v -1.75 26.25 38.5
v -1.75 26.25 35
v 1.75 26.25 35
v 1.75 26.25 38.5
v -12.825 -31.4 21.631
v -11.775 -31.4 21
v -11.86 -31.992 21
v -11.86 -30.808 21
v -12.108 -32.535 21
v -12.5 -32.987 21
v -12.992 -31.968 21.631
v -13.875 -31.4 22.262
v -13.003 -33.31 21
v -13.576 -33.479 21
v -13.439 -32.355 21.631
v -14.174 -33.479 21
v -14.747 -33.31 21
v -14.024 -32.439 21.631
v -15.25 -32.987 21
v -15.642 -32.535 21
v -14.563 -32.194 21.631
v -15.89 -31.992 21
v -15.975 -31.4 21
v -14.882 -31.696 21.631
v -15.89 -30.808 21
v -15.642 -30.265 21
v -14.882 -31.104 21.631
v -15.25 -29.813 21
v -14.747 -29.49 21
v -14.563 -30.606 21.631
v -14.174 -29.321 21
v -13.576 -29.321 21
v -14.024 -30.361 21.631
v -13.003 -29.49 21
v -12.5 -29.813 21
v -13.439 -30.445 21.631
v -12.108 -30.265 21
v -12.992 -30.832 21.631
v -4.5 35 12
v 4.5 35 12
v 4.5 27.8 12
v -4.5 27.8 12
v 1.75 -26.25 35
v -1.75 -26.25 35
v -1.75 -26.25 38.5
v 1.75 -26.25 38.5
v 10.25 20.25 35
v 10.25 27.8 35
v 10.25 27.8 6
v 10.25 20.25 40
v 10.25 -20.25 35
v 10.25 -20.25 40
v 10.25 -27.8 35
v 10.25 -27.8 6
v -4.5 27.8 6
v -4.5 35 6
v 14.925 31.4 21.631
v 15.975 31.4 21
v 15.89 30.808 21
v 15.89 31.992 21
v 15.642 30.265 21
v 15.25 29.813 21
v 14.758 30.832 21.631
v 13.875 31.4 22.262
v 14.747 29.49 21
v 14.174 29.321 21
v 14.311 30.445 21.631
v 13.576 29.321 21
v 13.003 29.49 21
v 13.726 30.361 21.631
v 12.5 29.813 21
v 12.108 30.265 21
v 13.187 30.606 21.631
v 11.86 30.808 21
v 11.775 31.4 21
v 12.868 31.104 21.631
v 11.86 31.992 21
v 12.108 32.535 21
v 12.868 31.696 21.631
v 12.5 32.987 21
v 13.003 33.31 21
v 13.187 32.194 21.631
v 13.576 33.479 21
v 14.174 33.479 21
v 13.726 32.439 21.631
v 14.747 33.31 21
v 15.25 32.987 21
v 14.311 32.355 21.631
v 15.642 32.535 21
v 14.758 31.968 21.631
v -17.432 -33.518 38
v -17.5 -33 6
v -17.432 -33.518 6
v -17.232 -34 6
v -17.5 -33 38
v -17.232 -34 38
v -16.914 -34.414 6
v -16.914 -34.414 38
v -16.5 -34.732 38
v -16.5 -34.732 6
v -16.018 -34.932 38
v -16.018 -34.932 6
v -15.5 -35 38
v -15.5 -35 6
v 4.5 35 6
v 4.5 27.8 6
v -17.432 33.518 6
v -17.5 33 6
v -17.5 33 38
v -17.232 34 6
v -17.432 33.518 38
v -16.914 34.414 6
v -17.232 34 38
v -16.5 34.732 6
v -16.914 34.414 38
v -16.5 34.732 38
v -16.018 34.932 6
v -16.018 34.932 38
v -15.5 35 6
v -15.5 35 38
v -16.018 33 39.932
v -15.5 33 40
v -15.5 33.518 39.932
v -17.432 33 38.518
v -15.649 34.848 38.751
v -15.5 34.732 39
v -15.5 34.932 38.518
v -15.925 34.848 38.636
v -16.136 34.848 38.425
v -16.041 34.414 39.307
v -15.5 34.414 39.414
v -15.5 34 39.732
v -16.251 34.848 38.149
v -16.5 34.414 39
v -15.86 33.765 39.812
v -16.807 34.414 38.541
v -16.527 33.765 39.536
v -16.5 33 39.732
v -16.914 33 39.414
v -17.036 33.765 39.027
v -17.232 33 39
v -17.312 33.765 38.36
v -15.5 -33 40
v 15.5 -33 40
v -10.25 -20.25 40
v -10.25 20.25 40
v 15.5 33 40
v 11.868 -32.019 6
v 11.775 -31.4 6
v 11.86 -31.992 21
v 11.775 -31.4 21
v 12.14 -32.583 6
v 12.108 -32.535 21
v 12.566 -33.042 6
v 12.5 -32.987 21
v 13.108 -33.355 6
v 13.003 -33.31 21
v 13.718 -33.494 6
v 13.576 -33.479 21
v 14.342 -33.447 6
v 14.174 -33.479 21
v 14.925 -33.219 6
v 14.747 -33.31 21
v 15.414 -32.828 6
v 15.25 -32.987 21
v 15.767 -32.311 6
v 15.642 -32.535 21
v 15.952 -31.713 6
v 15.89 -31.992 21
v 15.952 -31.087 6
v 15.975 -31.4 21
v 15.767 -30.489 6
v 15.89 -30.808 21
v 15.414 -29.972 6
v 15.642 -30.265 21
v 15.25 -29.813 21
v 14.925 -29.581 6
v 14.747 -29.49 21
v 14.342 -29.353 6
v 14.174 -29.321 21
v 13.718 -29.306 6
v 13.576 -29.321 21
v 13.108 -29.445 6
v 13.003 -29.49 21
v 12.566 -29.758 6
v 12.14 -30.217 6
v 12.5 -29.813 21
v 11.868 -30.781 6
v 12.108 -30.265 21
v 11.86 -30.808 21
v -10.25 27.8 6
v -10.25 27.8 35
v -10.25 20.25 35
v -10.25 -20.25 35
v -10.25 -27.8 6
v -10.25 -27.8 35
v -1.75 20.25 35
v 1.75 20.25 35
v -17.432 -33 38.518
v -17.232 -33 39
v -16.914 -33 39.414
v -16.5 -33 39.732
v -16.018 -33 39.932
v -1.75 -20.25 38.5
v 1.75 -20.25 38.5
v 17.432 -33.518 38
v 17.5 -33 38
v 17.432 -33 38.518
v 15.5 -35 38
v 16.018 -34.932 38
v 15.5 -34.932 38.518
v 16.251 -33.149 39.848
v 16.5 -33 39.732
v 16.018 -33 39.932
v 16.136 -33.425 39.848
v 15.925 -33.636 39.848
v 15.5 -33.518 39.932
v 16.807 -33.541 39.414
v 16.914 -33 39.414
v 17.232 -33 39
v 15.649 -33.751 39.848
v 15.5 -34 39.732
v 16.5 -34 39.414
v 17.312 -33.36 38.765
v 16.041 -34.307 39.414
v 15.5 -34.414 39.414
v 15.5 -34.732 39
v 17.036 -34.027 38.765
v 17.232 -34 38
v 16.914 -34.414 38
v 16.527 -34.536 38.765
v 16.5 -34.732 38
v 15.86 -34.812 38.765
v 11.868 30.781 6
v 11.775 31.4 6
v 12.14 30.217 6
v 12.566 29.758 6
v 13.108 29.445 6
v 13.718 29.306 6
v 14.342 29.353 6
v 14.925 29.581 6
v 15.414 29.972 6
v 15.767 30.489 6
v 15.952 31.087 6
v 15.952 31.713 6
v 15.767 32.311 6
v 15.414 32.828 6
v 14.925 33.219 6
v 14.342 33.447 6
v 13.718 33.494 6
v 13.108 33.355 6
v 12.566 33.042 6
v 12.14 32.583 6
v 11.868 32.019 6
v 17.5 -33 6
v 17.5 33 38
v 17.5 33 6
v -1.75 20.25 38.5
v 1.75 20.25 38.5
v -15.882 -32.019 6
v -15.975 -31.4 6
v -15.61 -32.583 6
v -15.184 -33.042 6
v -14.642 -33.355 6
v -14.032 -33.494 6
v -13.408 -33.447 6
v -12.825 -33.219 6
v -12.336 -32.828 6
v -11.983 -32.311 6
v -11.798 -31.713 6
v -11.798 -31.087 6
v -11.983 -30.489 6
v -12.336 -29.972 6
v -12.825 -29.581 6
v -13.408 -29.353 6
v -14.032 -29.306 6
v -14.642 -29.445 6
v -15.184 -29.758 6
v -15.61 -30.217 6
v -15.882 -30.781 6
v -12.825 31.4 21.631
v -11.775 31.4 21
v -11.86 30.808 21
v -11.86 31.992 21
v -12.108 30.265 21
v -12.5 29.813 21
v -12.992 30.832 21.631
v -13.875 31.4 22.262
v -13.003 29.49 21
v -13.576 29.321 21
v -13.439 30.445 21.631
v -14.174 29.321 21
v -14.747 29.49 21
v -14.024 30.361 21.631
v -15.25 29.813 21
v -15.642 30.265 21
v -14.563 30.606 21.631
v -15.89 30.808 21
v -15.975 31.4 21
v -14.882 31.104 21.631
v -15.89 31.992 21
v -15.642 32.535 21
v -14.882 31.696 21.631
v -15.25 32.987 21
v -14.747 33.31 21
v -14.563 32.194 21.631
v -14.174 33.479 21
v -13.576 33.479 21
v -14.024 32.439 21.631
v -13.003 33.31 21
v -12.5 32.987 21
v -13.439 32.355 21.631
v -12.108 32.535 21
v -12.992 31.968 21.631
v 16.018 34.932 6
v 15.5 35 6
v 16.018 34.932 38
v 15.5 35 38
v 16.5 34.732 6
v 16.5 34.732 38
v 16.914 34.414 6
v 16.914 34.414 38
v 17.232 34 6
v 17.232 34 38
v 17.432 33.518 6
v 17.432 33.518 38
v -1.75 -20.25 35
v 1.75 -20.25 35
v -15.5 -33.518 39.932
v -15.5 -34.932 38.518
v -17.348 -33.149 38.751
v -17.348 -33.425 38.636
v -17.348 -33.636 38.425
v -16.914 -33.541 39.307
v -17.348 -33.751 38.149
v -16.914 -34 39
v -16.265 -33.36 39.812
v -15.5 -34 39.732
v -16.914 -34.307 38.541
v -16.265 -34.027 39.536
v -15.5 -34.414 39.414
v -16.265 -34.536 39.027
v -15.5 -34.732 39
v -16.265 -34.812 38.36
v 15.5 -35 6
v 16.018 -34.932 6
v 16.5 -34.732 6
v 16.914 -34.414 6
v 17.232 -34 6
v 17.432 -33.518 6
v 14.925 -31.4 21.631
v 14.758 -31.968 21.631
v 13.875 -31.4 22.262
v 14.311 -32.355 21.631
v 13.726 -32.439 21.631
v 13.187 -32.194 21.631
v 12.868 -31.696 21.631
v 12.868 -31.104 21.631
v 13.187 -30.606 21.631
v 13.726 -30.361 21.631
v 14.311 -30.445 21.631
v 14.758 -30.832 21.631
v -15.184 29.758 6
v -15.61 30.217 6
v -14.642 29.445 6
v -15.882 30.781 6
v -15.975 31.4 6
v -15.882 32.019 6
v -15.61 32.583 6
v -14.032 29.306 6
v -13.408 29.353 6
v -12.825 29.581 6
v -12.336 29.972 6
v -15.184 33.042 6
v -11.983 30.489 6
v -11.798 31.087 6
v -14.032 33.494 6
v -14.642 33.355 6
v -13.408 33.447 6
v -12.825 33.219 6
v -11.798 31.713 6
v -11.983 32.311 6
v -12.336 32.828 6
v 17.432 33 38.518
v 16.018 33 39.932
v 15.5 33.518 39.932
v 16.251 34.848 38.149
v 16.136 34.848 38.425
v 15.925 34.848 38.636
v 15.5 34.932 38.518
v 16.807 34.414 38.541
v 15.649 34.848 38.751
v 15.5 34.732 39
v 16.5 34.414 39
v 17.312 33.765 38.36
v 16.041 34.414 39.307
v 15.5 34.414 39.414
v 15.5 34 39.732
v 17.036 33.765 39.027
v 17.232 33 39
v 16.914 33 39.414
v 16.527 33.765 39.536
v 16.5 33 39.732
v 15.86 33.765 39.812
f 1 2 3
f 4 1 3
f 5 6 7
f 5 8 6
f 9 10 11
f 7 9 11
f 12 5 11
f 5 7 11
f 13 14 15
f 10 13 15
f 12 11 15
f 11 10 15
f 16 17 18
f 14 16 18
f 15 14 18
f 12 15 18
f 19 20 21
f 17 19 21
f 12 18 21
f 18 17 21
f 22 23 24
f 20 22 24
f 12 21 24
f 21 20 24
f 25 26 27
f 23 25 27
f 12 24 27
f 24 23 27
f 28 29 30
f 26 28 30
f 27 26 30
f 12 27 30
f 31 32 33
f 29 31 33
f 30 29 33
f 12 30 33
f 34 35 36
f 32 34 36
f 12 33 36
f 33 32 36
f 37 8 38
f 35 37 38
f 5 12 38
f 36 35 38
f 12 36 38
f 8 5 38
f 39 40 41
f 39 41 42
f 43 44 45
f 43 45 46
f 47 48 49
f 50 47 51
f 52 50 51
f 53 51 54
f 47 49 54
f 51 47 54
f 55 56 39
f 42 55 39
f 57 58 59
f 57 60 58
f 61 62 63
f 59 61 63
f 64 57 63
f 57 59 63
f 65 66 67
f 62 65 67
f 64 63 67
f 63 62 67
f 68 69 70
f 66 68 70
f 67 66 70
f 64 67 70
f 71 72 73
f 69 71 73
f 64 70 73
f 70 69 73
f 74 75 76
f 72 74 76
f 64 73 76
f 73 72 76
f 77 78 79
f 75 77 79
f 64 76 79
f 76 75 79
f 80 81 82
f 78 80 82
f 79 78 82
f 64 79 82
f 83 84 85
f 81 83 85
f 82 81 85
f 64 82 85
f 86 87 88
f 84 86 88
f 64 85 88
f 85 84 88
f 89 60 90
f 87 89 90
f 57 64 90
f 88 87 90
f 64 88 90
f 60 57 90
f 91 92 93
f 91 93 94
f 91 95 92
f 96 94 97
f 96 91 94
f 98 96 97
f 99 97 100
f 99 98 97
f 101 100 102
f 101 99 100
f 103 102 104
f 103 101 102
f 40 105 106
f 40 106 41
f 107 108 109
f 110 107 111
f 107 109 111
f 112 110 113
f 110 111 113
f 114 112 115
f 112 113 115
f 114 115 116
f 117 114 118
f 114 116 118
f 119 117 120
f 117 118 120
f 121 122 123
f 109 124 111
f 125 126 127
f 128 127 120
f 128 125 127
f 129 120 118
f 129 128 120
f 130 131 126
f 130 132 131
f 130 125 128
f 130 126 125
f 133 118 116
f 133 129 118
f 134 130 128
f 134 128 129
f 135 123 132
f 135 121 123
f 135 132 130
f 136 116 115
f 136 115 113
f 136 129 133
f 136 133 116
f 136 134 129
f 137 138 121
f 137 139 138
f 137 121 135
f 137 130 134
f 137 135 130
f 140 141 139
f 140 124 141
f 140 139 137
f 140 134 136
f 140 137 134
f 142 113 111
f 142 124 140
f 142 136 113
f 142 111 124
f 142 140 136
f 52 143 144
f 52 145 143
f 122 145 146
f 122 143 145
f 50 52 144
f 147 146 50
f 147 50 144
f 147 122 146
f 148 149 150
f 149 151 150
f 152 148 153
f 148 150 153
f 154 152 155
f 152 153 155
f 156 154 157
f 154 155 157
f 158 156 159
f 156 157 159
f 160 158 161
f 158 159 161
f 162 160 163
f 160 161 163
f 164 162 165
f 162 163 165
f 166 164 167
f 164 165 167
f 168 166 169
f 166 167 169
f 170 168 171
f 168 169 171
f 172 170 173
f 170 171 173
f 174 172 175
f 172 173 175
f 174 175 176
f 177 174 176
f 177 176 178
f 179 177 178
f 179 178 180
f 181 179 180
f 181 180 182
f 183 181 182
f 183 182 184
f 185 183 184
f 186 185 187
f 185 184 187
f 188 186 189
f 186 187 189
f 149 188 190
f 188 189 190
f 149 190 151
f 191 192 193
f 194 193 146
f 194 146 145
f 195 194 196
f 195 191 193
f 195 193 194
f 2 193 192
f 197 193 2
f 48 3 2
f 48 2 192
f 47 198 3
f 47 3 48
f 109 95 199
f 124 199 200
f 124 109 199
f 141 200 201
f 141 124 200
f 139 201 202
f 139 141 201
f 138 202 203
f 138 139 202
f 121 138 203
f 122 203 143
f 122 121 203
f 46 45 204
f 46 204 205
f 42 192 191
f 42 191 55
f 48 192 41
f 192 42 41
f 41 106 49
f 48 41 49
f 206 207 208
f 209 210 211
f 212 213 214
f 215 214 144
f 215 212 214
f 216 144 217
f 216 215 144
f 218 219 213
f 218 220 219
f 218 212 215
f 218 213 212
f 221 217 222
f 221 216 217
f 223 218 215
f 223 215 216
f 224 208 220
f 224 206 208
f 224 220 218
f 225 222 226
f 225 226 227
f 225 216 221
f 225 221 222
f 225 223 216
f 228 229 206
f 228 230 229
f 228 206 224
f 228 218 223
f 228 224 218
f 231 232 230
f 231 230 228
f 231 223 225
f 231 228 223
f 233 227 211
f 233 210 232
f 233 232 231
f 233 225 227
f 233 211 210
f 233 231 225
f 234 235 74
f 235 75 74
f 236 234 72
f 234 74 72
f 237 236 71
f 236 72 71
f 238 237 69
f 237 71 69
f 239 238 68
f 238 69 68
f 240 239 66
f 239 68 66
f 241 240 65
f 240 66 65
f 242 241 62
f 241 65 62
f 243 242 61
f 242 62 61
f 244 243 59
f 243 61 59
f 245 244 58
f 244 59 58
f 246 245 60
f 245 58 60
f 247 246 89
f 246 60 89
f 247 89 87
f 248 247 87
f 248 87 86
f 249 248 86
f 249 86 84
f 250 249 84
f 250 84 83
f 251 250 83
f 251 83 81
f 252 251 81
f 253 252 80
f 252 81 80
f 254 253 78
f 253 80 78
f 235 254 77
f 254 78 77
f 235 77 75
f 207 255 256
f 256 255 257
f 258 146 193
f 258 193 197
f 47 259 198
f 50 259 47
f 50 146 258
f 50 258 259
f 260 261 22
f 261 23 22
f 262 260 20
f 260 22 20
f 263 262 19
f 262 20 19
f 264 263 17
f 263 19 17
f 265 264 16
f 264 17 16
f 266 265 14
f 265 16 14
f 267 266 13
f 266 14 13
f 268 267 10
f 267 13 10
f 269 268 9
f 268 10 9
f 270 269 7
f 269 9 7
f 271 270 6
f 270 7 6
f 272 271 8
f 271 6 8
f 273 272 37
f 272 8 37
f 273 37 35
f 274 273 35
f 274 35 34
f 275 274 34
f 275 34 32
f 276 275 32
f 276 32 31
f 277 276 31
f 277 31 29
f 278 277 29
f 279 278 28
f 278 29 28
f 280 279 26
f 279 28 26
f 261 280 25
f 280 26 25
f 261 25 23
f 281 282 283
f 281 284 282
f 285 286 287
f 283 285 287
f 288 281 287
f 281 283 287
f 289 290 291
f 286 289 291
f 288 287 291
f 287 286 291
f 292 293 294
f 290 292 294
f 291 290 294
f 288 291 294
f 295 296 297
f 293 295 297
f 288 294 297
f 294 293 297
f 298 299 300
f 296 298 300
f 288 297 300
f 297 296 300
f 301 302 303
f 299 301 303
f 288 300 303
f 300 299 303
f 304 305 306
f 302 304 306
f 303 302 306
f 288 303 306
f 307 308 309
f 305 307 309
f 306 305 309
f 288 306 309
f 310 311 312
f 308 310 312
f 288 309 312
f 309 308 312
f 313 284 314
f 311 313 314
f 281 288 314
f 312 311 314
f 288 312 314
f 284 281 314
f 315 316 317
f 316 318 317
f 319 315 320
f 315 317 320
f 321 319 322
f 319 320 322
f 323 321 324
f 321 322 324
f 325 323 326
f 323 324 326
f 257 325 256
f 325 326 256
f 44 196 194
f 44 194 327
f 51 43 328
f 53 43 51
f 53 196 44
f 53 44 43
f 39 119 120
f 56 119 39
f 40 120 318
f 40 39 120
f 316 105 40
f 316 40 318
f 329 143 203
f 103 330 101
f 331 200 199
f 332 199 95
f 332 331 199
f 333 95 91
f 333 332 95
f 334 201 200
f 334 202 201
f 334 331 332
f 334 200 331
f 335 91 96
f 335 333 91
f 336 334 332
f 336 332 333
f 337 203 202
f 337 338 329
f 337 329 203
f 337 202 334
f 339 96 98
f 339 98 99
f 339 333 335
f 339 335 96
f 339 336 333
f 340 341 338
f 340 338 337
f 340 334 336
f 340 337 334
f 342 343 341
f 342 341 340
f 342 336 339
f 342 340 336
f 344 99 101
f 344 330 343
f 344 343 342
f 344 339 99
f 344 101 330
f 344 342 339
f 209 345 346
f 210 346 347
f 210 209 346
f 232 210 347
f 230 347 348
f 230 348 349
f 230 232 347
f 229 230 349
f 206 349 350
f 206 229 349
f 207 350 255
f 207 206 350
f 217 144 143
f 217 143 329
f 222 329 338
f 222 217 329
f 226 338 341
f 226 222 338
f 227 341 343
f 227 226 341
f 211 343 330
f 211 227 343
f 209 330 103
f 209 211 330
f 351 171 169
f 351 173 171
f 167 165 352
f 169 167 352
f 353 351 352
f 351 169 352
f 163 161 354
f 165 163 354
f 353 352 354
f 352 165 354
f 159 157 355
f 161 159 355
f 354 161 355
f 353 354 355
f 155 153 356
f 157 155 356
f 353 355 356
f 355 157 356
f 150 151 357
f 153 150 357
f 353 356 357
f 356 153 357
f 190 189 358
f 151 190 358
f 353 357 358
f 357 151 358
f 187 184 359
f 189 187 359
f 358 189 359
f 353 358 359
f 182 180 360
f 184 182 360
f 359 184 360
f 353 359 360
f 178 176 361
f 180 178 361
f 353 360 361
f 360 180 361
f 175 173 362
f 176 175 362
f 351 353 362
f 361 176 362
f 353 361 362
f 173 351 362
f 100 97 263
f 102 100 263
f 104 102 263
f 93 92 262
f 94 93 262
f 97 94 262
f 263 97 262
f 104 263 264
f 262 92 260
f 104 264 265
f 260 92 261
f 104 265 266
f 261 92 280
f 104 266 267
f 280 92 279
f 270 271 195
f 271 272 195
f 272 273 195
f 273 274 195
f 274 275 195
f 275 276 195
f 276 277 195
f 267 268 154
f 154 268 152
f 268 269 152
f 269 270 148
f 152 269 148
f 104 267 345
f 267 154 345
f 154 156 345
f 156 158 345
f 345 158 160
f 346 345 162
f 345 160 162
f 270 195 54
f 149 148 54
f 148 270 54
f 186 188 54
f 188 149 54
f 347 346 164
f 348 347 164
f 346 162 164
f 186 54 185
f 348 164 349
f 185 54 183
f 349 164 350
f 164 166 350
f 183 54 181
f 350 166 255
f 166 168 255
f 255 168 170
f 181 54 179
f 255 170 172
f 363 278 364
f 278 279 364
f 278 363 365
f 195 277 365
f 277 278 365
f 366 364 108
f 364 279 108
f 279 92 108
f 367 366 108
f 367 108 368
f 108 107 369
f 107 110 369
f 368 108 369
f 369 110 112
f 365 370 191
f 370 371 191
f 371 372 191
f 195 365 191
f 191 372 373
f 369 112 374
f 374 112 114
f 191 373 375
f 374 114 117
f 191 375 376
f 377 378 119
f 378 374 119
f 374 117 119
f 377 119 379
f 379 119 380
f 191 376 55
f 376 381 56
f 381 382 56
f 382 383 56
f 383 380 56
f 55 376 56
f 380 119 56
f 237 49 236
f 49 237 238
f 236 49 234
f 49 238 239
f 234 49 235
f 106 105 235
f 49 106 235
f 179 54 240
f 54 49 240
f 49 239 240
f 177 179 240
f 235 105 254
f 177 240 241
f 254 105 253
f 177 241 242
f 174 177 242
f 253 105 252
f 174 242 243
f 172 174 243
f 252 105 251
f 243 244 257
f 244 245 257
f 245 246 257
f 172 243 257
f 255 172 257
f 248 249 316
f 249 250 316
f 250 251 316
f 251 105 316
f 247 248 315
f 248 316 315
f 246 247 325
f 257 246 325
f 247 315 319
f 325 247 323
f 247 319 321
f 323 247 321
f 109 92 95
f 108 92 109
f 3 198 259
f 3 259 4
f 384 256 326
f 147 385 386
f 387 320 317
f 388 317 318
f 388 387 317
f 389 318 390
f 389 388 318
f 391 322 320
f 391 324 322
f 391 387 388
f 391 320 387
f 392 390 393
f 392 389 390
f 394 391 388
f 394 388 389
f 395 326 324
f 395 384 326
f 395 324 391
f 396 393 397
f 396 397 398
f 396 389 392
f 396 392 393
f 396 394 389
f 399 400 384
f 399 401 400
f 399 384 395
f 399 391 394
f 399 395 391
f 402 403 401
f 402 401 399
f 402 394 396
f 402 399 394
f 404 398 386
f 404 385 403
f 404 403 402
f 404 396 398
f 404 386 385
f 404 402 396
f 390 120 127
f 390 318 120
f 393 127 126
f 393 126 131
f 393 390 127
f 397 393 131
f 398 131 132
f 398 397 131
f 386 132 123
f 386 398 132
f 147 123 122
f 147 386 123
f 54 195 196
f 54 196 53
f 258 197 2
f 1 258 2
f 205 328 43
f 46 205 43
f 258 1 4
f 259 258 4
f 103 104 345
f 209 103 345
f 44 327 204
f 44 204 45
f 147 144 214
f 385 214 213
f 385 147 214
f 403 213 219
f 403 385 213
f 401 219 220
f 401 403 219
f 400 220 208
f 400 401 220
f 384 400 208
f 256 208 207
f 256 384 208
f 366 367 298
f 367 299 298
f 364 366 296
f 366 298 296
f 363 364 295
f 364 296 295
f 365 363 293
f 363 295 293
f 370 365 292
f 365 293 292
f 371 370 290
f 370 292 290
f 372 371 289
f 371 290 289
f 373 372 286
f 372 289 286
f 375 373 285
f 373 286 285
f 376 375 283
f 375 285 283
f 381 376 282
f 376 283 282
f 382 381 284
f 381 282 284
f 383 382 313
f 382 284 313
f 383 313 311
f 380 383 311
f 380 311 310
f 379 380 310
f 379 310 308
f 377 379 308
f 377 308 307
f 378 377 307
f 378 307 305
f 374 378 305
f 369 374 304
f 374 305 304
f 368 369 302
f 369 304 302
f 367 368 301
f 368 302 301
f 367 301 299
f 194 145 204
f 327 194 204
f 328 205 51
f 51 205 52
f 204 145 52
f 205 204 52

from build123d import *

# Parameters (mm, degrees)
F0_W      = 35
F0_H      = 70
F1_DEPTH  = 40
F2_W      = 20.5
F2_H      = 55.6
F3_DEPTH  = 35
F4_W      = 20.5
F4_H      = 40.5
F5_DEPTH  = 25
F6_DEPTH  = 6
F7_W      = 3.5
F7_H      = 6
F8_DEPTH  = 3.5
F10_D     = 4.2
F10_DEPTH = 15
F10_TIP   = 1.2618073
F11_R     = 2
F12_W     = 9
F12_H     = 6
F13_DEPTH = 10


# Not quite as in the source:
# - a pattern or mirror of a feature is missing from the dataset's text; its kind, count and spacing are read off the source's solid


with BuildPart() as f1:
    # F0 (on Top) → F1 (new body)
    with BuildSketch(Plane.XY):
        Rectangle(F0_W, F0_H)
    extrude(amount=F1_DEPTH)

    # F2 (on face) → F3 (cut)
    with BuildSketch(Plane(origin=(0, 0, 0), x_dir=(1, 0, 0), z_dir=(0, 0, -1))):
        Rectangle(F2_W, F2_H)
    extrude(amount=-F3_DEPTH, mode=Mode.SUBTRACT)

    # F4 (on face) → F5 (cut)
    with BuildSketch(Plane.XY.offset(40)):
        Rectangle(F4_W, F4_H)
    extrude(amount=-F5_DEPTH, mode=Mode.SUBTRACT)

    # F6 (cut): a face of the model
    f6_faces = [f1.faces().sort_by_distance(p)[0] for p in [
        (16.7173762079, 0, 0),
    ]]
    extrude(f6_faces, amount=-F6_DEPTH, mode=Mode.SUBTRACT)

    # F7 (on face) → F8 (cut)
    with BuildSketch(Plane(origin=(0, 0, 35), x_dir=(1, 0, 0), z_dir=(0, 0, -1))):
        with Locations((0, 23.25)):
            Rectangle(F7_W, F7_H)
    f8 = extrude(amount=-F8_DEPTH, mode=Mode.SUBTRACT)

    # F8_copies: F8 across plane
    add(f8.mirror(Plane.ZX), mode=Mode.SUBTRACT)

    # F10
    with Locations(Plane(origin=(0, 0, 6), x_dir=(1, 0, 0), z_dir=(0, 0, -1))):
        with Locations((-13.875, 31.4), (13.875, 31.4), (13.875, -31.4), (-13.875, -31.4)):
            Hole(F10_D / 2, depth=F10_DEPTH)
            with Locations((0, 0, -(F10_DEPTH + F10_TIP / 2))):  # 118° drill point
                Cone(0, F10_D / 2, F10_TIP, mode=Mode.SUBTRACT)

    # F11
    f11_edges = [f1.edges().sort_by_distance(p)[0] for p in [
        (17.5, -35, 23),
        (17.5, 0, 40),
        (0, -35, 40),
        (-17.5, 0, 40),
        (17.5, 35, 23),
        (0, 35, 40),
        (-17.5, -35, 23),
        (-17.5, 35, 23),
    ]]
    fillet(f11_edges, radius=F11_R)

    # F12 (on face) → F13 (cut)
    with BuildSketch(Plane(origin=(0, 35, 0), x_dir=(-1, 0, 0), z_dir=(0, 1, 0))):
        with Locations((0, 9)):
            Rectangle(F12_W, F12_H)
    extrude(amount=-F13_DEPTH, mode=Mode.SUBTRACT)


solid = f1.part
